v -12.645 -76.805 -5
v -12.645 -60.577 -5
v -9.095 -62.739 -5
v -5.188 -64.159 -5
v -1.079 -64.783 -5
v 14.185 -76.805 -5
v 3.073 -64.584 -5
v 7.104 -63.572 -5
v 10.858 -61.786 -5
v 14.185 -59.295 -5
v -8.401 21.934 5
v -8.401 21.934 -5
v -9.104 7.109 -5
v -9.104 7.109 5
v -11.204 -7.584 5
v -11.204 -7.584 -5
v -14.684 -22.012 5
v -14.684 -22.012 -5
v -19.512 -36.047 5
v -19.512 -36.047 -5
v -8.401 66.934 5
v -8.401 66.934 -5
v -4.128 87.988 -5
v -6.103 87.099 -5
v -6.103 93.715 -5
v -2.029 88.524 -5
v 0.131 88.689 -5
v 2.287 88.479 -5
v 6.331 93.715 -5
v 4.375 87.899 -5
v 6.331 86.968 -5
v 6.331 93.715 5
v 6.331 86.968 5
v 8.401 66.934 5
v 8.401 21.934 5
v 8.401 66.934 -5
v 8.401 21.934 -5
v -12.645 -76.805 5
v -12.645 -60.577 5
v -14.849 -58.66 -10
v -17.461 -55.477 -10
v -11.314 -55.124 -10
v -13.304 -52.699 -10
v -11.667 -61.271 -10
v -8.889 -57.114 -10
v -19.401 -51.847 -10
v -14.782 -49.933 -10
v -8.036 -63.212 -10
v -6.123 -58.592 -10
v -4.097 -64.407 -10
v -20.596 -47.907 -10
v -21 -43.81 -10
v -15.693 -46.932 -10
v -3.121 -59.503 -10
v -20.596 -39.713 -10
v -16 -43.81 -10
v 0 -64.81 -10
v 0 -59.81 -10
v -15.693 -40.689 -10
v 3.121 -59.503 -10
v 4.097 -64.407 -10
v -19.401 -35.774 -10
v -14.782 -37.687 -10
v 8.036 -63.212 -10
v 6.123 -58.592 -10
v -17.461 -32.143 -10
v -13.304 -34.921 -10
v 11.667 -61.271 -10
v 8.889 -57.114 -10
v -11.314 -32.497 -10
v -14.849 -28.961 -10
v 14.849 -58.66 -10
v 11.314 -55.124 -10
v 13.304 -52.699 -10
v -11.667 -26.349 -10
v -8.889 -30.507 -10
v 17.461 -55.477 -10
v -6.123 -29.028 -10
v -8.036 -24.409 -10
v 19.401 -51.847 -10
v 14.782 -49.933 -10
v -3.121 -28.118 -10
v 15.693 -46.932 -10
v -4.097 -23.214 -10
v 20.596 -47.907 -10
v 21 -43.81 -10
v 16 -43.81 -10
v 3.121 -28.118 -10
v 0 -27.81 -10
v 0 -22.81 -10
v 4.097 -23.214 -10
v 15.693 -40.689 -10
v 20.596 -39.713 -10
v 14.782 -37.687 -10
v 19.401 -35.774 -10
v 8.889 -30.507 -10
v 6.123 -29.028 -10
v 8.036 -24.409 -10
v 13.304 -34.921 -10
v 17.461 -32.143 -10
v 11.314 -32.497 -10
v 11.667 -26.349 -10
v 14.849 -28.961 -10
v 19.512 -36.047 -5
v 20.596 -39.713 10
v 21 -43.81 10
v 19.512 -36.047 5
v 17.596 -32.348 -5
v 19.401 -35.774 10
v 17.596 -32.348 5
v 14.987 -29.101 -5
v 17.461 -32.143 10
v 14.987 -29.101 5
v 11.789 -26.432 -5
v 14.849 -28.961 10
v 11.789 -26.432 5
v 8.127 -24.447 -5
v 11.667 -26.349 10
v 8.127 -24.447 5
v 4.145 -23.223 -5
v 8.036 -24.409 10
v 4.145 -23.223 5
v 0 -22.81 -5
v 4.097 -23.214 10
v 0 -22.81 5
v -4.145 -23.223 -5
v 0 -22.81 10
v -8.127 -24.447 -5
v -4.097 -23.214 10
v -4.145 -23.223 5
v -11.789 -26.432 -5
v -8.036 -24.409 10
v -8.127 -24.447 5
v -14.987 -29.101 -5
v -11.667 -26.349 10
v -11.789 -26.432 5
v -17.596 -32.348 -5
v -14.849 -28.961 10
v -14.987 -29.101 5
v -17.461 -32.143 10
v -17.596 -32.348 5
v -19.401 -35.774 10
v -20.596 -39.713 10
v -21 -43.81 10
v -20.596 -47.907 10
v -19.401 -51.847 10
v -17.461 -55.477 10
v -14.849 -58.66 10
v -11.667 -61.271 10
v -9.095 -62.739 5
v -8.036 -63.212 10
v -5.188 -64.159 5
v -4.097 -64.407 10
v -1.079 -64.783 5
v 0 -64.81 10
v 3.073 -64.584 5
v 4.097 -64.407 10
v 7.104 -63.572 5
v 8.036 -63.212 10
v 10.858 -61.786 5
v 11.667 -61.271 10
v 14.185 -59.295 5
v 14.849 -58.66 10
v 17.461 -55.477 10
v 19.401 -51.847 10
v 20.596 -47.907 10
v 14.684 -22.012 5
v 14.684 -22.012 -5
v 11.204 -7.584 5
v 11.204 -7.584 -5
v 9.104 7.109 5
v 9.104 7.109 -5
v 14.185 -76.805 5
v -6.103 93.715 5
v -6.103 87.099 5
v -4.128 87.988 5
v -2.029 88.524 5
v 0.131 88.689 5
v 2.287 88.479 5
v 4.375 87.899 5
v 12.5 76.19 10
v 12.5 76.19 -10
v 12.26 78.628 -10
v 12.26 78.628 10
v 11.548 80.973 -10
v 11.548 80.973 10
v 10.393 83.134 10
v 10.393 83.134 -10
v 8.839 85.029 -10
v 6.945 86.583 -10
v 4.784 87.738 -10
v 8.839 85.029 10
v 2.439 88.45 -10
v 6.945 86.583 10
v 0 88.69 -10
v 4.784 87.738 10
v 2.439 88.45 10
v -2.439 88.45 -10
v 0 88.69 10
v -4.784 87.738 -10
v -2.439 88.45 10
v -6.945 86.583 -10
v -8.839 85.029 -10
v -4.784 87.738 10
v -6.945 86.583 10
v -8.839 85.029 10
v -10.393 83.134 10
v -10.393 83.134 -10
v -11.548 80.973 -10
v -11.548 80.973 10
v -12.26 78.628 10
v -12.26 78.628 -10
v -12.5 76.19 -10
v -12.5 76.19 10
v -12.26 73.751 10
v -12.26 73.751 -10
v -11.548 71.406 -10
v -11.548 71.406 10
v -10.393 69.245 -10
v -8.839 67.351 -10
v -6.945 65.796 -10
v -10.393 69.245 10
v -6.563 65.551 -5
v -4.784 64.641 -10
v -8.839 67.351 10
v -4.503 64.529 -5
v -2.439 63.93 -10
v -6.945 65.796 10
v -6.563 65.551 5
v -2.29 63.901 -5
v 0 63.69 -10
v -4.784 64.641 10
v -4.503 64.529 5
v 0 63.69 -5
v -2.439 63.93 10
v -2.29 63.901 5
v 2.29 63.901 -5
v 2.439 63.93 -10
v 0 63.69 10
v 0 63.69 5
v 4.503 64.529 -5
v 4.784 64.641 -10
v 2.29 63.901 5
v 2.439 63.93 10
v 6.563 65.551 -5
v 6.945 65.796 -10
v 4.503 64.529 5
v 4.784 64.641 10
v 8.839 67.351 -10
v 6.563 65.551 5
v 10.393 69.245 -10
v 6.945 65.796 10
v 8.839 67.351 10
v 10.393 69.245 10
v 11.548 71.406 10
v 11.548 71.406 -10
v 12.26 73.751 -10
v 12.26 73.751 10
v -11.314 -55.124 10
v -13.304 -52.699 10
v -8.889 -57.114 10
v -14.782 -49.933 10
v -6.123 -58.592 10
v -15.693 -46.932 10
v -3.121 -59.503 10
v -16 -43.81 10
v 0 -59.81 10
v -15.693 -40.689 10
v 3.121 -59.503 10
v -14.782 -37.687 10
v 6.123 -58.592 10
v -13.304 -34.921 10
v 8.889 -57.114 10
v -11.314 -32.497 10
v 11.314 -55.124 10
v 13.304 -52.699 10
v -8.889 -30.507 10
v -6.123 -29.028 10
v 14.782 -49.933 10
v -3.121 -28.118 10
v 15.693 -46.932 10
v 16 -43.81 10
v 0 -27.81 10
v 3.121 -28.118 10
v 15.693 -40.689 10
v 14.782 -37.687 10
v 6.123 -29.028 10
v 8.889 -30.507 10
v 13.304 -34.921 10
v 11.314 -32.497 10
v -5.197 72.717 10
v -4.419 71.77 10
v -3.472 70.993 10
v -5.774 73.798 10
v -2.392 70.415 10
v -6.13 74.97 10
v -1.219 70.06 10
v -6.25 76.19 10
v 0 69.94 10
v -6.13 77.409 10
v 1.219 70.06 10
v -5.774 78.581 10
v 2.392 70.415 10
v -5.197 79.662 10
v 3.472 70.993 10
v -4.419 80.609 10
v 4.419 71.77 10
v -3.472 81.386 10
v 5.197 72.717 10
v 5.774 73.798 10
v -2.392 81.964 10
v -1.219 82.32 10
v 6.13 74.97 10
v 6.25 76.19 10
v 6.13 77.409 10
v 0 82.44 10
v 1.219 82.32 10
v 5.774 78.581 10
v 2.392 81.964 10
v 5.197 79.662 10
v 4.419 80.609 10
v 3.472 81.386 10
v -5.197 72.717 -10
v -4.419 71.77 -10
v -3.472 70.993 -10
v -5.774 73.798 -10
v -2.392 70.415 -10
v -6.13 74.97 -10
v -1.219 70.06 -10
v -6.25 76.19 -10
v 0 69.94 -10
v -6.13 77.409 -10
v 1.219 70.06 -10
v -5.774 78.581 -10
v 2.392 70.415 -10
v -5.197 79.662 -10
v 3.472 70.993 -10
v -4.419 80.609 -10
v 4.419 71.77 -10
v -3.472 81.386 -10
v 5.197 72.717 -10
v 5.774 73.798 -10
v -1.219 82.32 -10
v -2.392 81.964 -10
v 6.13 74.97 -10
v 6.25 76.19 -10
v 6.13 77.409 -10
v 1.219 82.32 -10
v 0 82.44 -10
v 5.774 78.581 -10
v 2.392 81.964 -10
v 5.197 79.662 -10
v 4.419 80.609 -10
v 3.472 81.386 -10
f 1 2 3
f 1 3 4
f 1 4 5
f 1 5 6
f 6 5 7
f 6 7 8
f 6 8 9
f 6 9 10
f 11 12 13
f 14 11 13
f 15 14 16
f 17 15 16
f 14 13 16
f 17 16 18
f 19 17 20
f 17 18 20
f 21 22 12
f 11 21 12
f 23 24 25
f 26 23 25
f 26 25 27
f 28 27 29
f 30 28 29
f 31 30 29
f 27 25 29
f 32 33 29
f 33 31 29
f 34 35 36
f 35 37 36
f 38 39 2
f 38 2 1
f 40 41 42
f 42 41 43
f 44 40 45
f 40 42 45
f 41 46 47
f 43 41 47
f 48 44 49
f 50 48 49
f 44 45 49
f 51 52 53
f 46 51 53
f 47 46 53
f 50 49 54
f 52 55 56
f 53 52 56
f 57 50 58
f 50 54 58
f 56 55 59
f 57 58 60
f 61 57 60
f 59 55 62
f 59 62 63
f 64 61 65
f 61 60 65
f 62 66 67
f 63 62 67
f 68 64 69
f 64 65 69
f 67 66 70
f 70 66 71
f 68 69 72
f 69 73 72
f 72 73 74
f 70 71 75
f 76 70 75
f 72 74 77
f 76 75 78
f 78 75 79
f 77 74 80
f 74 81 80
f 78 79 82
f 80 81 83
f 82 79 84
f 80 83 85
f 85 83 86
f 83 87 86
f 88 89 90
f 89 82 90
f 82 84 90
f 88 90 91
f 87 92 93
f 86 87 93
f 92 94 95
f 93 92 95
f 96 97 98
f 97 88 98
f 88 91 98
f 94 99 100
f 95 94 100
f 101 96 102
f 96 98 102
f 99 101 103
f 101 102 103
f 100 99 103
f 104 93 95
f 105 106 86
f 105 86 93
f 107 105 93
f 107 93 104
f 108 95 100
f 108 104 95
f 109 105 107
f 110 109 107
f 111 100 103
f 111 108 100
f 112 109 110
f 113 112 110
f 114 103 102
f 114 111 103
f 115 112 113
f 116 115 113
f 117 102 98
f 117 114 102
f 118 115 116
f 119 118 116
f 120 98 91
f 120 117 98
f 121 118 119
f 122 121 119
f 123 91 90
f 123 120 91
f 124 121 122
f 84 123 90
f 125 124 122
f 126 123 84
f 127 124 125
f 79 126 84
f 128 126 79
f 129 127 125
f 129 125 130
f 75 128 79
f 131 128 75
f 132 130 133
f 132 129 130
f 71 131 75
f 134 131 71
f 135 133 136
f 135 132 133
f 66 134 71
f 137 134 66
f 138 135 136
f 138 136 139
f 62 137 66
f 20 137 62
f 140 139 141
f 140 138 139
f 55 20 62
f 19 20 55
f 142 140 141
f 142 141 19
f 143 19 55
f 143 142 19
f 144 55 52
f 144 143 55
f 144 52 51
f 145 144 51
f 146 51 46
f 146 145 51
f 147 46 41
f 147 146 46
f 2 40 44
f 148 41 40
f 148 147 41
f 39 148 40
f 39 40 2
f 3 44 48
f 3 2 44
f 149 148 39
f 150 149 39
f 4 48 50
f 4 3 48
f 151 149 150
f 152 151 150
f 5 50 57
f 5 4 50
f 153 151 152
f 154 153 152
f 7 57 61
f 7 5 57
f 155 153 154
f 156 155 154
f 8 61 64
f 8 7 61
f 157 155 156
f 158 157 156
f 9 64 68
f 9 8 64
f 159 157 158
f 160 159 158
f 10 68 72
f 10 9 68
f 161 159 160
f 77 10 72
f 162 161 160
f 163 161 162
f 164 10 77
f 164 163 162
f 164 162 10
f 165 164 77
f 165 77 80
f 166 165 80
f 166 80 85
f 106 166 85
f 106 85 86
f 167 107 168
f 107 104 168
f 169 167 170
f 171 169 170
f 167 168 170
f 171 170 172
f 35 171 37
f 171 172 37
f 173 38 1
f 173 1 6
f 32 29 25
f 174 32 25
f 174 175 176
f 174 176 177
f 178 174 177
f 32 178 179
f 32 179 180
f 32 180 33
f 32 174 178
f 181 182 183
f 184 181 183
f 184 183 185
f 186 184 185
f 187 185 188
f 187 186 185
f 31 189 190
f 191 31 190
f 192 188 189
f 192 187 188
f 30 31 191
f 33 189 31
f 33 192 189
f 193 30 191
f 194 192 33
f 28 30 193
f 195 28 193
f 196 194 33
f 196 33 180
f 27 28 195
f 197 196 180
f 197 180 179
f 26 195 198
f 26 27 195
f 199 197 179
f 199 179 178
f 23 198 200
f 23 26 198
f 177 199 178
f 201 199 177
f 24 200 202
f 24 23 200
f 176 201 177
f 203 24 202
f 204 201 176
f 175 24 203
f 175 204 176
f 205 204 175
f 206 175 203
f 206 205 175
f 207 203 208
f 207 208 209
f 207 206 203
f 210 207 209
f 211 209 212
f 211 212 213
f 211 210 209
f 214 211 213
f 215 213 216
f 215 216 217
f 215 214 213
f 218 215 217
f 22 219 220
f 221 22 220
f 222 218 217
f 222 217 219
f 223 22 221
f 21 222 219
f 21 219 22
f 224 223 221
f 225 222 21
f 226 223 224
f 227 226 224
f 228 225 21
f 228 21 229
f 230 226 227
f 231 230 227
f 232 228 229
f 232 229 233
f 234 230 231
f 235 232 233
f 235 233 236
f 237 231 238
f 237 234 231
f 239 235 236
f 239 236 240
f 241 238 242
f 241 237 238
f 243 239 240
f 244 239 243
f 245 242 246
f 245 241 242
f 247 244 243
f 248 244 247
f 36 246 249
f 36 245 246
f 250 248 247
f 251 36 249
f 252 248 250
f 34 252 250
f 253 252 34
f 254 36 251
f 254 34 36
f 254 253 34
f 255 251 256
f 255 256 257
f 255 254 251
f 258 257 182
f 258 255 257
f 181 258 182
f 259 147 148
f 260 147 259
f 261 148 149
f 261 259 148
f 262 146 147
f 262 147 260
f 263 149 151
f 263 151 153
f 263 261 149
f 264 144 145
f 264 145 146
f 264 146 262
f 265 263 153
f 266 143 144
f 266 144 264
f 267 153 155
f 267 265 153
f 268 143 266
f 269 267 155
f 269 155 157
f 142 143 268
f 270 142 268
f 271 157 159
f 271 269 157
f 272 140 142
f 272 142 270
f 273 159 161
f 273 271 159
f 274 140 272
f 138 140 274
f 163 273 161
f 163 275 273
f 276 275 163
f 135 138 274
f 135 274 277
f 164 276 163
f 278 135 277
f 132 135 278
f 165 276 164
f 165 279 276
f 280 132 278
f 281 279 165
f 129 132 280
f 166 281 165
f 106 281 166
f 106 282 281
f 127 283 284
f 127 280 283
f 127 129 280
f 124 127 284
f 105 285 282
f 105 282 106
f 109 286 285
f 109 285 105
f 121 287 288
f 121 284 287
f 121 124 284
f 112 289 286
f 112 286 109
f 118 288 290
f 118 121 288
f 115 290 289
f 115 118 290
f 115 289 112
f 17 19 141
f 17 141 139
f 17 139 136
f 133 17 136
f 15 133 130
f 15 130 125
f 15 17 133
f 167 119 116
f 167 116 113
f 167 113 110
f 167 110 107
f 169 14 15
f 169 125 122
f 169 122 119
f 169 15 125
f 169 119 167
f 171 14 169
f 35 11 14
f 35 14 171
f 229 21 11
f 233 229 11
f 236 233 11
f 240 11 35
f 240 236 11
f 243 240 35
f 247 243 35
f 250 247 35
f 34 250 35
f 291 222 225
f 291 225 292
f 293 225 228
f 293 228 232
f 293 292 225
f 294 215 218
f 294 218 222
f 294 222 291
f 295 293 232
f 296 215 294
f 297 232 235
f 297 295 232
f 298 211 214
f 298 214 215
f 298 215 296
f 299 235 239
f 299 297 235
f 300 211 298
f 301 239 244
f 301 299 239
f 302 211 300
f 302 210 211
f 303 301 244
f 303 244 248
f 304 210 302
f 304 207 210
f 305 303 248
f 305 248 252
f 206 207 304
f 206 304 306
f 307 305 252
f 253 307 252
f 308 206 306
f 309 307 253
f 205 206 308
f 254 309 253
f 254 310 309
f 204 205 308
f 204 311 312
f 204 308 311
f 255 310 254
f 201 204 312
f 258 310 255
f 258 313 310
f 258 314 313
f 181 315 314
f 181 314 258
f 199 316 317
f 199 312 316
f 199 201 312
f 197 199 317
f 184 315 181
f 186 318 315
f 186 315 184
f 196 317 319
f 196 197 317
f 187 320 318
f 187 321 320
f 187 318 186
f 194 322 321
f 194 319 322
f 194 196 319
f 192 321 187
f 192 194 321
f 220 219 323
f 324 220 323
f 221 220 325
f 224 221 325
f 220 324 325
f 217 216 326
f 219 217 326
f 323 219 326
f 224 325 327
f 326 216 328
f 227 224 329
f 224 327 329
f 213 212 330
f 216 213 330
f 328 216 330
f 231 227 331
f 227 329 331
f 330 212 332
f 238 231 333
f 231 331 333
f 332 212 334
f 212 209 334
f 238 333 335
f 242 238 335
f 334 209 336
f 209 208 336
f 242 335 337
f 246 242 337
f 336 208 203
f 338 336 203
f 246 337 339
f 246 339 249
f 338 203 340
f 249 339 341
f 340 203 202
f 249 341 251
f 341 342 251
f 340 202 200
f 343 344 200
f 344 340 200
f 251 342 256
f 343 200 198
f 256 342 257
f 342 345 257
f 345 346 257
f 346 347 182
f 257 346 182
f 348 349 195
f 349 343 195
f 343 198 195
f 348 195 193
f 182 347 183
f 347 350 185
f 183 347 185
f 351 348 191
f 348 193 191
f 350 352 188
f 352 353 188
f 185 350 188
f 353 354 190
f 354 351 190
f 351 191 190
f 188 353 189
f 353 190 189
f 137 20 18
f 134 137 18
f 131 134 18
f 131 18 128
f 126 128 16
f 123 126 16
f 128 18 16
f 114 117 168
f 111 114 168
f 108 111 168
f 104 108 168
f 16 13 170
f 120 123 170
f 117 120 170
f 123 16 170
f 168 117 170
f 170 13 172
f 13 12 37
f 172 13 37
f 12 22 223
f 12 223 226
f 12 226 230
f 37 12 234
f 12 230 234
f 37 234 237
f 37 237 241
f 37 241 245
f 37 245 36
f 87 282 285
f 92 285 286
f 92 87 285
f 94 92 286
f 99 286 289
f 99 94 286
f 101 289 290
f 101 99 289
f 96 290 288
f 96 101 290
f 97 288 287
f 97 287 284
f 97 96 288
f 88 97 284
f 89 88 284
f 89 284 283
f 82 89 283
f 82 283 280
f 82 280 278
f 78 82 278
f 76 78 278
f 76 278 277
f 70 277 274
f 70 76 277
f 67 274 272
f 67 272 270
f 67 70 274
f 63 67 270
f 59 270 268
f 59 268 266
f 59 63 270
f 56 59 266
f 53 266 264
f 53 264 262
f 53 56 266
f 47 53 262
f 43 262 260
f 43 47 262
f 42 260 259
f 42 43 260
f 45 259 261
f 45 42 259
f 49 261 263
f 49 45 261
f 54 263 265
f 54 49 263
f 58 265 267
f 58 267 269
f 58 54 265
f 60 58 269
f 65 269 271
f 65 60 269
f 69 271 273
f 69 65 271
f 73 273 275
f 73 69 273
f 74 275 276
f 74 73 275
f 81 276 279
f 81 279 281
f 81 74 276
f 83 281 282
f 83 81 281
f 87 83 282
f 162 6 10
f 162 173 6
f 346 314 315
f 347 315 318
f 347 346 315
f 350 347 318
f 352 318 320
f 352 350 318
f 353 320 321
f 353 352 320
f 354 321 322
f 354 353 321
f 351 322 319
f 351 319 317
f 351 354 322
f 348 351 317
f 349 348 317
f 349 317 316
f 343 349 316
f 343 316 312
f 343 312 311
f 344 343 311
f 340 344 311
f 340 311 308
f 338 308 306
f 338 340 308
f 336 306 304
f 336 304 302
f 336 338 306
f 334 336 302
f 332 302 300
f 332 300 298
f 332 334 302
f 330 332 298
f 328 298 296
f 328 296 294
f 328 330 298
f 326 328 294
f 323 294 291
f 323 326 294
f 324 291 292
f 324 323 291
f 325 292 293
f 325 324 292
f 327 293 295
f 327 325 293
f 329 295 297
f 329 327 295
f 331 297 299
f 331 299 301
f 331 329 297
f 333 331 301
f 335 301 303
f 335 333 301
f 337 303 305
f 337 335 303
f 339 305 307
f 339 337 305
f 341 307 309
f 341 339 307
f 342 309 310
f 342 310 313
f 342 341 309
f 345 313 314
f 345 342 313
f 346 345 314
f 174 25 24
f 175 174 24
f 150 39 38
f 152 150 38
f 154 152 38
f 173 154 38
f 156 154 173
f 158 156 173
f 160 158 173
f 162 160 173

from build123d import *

# Parameters (mm, degrees)
SKETCH2_R             = 21
SKETCH2_R_2           = 16
BOSS_EXTRUDE1_DEPTH   = 10
SKETCH2_R_3           = 12.5
SKETCH2_R_4           = 6.25
BOSS_EXTRUDE1_2_DEPTH = 10
BOSS_EXTRUDE2_DEPTH   = 5


with BuildPart() as part:
    # Sketch2 → Boss-Extrude1 (new, symmetric)
    with BuildSketch(Plane.XY):
        with Locations((0, -43.810288723)):
            Circle(SKETCH2_R)
        with Locations((0, -43.810288723)):
            Circle(SKETCH2_R_2, mode=Mode.SUBTRACT)
    extrude(amount=BOSS_EXTRUDE1_DEPTH, both=True)



with BuildPart() as body_2:
    # Sketch2 → Boss-Extrude1 2 (new, symmetric)
    with BuildSketch(Plane.XY):
        with Locations((0, 76.189711277)):
            Circle(SKETCH2_R_3)
        with Locations((0, 76.189711277)):
            Circle(SKETCH2_R_4, mode=Mode.SUBTRACT)
    extrude(amount=BOSS_EXTRUDE1_2_DEPTH, both=True)


with BuildPart() as part_1:
    add(part.part)

    add(body_2.part)  # Boss-Extrude2 merges body 2
    # Sketch2<3> → Boss-Extrude2 (add, symmetric)
    with BuildSketch(Plane.XY):
        with BuildLine():
            ThreePointArc((-8.40143978, 21.934128658), (-11.204201439, -7.583899174), (-19.512314514, -36.046940071))
            ThreePointArc((-19.512314514, -36.046940071), (0, -22.810288723), (19.512314514, -36.046940071))
            ThreePointArc((19.512314514, -36.046940071), (11.204201439, -7.583899174), (8.40143978, 21.934128658))
            Line((8.40143978, 21.934128658), (8.40143978, 66.934128658))
            ThreePointArc((8.40143978, 66.934128658), (0, 63.689711277), (-8.40143978, 66.934128658))
            Line((-8.40143978, 66.934128658), (-8.40143978, 21.934128658))
        make_face()
        with BuildLine():
            Line((-6.10309837, 93.714824033), (-6.10309837, 87.098523783))
            ThreePointArc((-6.10309837, 87.098523783), (0.131172403, 88.68902301), (6.330691245, 86.968038993))
            Line((6.330691245, 86.968038993), (6.330691245, 93.714824033))
            Line((6.330691245, 93.714824033), (-6.10309837, 93.714824033))
        make_face()
        with BuildLine():
            ThreePointArc((14.185268549, -59.295060475), (1.002030285, -64.786368798), (-12.644623669, -60.576728186))
            Line((-12.644623669, -60.576728186), (-12.644623669, -76.805395819))
            Line((-12.644623669, -76.805395819), (14.185268549, -76.805395819))
            Line((14.185268549, -76.805395819), (14.185268549, -59.295060475))
        make_face()
    extrude(amount=BOSS_EXTRUDE2_DEPTH, both=True)


solid = part_1.part
